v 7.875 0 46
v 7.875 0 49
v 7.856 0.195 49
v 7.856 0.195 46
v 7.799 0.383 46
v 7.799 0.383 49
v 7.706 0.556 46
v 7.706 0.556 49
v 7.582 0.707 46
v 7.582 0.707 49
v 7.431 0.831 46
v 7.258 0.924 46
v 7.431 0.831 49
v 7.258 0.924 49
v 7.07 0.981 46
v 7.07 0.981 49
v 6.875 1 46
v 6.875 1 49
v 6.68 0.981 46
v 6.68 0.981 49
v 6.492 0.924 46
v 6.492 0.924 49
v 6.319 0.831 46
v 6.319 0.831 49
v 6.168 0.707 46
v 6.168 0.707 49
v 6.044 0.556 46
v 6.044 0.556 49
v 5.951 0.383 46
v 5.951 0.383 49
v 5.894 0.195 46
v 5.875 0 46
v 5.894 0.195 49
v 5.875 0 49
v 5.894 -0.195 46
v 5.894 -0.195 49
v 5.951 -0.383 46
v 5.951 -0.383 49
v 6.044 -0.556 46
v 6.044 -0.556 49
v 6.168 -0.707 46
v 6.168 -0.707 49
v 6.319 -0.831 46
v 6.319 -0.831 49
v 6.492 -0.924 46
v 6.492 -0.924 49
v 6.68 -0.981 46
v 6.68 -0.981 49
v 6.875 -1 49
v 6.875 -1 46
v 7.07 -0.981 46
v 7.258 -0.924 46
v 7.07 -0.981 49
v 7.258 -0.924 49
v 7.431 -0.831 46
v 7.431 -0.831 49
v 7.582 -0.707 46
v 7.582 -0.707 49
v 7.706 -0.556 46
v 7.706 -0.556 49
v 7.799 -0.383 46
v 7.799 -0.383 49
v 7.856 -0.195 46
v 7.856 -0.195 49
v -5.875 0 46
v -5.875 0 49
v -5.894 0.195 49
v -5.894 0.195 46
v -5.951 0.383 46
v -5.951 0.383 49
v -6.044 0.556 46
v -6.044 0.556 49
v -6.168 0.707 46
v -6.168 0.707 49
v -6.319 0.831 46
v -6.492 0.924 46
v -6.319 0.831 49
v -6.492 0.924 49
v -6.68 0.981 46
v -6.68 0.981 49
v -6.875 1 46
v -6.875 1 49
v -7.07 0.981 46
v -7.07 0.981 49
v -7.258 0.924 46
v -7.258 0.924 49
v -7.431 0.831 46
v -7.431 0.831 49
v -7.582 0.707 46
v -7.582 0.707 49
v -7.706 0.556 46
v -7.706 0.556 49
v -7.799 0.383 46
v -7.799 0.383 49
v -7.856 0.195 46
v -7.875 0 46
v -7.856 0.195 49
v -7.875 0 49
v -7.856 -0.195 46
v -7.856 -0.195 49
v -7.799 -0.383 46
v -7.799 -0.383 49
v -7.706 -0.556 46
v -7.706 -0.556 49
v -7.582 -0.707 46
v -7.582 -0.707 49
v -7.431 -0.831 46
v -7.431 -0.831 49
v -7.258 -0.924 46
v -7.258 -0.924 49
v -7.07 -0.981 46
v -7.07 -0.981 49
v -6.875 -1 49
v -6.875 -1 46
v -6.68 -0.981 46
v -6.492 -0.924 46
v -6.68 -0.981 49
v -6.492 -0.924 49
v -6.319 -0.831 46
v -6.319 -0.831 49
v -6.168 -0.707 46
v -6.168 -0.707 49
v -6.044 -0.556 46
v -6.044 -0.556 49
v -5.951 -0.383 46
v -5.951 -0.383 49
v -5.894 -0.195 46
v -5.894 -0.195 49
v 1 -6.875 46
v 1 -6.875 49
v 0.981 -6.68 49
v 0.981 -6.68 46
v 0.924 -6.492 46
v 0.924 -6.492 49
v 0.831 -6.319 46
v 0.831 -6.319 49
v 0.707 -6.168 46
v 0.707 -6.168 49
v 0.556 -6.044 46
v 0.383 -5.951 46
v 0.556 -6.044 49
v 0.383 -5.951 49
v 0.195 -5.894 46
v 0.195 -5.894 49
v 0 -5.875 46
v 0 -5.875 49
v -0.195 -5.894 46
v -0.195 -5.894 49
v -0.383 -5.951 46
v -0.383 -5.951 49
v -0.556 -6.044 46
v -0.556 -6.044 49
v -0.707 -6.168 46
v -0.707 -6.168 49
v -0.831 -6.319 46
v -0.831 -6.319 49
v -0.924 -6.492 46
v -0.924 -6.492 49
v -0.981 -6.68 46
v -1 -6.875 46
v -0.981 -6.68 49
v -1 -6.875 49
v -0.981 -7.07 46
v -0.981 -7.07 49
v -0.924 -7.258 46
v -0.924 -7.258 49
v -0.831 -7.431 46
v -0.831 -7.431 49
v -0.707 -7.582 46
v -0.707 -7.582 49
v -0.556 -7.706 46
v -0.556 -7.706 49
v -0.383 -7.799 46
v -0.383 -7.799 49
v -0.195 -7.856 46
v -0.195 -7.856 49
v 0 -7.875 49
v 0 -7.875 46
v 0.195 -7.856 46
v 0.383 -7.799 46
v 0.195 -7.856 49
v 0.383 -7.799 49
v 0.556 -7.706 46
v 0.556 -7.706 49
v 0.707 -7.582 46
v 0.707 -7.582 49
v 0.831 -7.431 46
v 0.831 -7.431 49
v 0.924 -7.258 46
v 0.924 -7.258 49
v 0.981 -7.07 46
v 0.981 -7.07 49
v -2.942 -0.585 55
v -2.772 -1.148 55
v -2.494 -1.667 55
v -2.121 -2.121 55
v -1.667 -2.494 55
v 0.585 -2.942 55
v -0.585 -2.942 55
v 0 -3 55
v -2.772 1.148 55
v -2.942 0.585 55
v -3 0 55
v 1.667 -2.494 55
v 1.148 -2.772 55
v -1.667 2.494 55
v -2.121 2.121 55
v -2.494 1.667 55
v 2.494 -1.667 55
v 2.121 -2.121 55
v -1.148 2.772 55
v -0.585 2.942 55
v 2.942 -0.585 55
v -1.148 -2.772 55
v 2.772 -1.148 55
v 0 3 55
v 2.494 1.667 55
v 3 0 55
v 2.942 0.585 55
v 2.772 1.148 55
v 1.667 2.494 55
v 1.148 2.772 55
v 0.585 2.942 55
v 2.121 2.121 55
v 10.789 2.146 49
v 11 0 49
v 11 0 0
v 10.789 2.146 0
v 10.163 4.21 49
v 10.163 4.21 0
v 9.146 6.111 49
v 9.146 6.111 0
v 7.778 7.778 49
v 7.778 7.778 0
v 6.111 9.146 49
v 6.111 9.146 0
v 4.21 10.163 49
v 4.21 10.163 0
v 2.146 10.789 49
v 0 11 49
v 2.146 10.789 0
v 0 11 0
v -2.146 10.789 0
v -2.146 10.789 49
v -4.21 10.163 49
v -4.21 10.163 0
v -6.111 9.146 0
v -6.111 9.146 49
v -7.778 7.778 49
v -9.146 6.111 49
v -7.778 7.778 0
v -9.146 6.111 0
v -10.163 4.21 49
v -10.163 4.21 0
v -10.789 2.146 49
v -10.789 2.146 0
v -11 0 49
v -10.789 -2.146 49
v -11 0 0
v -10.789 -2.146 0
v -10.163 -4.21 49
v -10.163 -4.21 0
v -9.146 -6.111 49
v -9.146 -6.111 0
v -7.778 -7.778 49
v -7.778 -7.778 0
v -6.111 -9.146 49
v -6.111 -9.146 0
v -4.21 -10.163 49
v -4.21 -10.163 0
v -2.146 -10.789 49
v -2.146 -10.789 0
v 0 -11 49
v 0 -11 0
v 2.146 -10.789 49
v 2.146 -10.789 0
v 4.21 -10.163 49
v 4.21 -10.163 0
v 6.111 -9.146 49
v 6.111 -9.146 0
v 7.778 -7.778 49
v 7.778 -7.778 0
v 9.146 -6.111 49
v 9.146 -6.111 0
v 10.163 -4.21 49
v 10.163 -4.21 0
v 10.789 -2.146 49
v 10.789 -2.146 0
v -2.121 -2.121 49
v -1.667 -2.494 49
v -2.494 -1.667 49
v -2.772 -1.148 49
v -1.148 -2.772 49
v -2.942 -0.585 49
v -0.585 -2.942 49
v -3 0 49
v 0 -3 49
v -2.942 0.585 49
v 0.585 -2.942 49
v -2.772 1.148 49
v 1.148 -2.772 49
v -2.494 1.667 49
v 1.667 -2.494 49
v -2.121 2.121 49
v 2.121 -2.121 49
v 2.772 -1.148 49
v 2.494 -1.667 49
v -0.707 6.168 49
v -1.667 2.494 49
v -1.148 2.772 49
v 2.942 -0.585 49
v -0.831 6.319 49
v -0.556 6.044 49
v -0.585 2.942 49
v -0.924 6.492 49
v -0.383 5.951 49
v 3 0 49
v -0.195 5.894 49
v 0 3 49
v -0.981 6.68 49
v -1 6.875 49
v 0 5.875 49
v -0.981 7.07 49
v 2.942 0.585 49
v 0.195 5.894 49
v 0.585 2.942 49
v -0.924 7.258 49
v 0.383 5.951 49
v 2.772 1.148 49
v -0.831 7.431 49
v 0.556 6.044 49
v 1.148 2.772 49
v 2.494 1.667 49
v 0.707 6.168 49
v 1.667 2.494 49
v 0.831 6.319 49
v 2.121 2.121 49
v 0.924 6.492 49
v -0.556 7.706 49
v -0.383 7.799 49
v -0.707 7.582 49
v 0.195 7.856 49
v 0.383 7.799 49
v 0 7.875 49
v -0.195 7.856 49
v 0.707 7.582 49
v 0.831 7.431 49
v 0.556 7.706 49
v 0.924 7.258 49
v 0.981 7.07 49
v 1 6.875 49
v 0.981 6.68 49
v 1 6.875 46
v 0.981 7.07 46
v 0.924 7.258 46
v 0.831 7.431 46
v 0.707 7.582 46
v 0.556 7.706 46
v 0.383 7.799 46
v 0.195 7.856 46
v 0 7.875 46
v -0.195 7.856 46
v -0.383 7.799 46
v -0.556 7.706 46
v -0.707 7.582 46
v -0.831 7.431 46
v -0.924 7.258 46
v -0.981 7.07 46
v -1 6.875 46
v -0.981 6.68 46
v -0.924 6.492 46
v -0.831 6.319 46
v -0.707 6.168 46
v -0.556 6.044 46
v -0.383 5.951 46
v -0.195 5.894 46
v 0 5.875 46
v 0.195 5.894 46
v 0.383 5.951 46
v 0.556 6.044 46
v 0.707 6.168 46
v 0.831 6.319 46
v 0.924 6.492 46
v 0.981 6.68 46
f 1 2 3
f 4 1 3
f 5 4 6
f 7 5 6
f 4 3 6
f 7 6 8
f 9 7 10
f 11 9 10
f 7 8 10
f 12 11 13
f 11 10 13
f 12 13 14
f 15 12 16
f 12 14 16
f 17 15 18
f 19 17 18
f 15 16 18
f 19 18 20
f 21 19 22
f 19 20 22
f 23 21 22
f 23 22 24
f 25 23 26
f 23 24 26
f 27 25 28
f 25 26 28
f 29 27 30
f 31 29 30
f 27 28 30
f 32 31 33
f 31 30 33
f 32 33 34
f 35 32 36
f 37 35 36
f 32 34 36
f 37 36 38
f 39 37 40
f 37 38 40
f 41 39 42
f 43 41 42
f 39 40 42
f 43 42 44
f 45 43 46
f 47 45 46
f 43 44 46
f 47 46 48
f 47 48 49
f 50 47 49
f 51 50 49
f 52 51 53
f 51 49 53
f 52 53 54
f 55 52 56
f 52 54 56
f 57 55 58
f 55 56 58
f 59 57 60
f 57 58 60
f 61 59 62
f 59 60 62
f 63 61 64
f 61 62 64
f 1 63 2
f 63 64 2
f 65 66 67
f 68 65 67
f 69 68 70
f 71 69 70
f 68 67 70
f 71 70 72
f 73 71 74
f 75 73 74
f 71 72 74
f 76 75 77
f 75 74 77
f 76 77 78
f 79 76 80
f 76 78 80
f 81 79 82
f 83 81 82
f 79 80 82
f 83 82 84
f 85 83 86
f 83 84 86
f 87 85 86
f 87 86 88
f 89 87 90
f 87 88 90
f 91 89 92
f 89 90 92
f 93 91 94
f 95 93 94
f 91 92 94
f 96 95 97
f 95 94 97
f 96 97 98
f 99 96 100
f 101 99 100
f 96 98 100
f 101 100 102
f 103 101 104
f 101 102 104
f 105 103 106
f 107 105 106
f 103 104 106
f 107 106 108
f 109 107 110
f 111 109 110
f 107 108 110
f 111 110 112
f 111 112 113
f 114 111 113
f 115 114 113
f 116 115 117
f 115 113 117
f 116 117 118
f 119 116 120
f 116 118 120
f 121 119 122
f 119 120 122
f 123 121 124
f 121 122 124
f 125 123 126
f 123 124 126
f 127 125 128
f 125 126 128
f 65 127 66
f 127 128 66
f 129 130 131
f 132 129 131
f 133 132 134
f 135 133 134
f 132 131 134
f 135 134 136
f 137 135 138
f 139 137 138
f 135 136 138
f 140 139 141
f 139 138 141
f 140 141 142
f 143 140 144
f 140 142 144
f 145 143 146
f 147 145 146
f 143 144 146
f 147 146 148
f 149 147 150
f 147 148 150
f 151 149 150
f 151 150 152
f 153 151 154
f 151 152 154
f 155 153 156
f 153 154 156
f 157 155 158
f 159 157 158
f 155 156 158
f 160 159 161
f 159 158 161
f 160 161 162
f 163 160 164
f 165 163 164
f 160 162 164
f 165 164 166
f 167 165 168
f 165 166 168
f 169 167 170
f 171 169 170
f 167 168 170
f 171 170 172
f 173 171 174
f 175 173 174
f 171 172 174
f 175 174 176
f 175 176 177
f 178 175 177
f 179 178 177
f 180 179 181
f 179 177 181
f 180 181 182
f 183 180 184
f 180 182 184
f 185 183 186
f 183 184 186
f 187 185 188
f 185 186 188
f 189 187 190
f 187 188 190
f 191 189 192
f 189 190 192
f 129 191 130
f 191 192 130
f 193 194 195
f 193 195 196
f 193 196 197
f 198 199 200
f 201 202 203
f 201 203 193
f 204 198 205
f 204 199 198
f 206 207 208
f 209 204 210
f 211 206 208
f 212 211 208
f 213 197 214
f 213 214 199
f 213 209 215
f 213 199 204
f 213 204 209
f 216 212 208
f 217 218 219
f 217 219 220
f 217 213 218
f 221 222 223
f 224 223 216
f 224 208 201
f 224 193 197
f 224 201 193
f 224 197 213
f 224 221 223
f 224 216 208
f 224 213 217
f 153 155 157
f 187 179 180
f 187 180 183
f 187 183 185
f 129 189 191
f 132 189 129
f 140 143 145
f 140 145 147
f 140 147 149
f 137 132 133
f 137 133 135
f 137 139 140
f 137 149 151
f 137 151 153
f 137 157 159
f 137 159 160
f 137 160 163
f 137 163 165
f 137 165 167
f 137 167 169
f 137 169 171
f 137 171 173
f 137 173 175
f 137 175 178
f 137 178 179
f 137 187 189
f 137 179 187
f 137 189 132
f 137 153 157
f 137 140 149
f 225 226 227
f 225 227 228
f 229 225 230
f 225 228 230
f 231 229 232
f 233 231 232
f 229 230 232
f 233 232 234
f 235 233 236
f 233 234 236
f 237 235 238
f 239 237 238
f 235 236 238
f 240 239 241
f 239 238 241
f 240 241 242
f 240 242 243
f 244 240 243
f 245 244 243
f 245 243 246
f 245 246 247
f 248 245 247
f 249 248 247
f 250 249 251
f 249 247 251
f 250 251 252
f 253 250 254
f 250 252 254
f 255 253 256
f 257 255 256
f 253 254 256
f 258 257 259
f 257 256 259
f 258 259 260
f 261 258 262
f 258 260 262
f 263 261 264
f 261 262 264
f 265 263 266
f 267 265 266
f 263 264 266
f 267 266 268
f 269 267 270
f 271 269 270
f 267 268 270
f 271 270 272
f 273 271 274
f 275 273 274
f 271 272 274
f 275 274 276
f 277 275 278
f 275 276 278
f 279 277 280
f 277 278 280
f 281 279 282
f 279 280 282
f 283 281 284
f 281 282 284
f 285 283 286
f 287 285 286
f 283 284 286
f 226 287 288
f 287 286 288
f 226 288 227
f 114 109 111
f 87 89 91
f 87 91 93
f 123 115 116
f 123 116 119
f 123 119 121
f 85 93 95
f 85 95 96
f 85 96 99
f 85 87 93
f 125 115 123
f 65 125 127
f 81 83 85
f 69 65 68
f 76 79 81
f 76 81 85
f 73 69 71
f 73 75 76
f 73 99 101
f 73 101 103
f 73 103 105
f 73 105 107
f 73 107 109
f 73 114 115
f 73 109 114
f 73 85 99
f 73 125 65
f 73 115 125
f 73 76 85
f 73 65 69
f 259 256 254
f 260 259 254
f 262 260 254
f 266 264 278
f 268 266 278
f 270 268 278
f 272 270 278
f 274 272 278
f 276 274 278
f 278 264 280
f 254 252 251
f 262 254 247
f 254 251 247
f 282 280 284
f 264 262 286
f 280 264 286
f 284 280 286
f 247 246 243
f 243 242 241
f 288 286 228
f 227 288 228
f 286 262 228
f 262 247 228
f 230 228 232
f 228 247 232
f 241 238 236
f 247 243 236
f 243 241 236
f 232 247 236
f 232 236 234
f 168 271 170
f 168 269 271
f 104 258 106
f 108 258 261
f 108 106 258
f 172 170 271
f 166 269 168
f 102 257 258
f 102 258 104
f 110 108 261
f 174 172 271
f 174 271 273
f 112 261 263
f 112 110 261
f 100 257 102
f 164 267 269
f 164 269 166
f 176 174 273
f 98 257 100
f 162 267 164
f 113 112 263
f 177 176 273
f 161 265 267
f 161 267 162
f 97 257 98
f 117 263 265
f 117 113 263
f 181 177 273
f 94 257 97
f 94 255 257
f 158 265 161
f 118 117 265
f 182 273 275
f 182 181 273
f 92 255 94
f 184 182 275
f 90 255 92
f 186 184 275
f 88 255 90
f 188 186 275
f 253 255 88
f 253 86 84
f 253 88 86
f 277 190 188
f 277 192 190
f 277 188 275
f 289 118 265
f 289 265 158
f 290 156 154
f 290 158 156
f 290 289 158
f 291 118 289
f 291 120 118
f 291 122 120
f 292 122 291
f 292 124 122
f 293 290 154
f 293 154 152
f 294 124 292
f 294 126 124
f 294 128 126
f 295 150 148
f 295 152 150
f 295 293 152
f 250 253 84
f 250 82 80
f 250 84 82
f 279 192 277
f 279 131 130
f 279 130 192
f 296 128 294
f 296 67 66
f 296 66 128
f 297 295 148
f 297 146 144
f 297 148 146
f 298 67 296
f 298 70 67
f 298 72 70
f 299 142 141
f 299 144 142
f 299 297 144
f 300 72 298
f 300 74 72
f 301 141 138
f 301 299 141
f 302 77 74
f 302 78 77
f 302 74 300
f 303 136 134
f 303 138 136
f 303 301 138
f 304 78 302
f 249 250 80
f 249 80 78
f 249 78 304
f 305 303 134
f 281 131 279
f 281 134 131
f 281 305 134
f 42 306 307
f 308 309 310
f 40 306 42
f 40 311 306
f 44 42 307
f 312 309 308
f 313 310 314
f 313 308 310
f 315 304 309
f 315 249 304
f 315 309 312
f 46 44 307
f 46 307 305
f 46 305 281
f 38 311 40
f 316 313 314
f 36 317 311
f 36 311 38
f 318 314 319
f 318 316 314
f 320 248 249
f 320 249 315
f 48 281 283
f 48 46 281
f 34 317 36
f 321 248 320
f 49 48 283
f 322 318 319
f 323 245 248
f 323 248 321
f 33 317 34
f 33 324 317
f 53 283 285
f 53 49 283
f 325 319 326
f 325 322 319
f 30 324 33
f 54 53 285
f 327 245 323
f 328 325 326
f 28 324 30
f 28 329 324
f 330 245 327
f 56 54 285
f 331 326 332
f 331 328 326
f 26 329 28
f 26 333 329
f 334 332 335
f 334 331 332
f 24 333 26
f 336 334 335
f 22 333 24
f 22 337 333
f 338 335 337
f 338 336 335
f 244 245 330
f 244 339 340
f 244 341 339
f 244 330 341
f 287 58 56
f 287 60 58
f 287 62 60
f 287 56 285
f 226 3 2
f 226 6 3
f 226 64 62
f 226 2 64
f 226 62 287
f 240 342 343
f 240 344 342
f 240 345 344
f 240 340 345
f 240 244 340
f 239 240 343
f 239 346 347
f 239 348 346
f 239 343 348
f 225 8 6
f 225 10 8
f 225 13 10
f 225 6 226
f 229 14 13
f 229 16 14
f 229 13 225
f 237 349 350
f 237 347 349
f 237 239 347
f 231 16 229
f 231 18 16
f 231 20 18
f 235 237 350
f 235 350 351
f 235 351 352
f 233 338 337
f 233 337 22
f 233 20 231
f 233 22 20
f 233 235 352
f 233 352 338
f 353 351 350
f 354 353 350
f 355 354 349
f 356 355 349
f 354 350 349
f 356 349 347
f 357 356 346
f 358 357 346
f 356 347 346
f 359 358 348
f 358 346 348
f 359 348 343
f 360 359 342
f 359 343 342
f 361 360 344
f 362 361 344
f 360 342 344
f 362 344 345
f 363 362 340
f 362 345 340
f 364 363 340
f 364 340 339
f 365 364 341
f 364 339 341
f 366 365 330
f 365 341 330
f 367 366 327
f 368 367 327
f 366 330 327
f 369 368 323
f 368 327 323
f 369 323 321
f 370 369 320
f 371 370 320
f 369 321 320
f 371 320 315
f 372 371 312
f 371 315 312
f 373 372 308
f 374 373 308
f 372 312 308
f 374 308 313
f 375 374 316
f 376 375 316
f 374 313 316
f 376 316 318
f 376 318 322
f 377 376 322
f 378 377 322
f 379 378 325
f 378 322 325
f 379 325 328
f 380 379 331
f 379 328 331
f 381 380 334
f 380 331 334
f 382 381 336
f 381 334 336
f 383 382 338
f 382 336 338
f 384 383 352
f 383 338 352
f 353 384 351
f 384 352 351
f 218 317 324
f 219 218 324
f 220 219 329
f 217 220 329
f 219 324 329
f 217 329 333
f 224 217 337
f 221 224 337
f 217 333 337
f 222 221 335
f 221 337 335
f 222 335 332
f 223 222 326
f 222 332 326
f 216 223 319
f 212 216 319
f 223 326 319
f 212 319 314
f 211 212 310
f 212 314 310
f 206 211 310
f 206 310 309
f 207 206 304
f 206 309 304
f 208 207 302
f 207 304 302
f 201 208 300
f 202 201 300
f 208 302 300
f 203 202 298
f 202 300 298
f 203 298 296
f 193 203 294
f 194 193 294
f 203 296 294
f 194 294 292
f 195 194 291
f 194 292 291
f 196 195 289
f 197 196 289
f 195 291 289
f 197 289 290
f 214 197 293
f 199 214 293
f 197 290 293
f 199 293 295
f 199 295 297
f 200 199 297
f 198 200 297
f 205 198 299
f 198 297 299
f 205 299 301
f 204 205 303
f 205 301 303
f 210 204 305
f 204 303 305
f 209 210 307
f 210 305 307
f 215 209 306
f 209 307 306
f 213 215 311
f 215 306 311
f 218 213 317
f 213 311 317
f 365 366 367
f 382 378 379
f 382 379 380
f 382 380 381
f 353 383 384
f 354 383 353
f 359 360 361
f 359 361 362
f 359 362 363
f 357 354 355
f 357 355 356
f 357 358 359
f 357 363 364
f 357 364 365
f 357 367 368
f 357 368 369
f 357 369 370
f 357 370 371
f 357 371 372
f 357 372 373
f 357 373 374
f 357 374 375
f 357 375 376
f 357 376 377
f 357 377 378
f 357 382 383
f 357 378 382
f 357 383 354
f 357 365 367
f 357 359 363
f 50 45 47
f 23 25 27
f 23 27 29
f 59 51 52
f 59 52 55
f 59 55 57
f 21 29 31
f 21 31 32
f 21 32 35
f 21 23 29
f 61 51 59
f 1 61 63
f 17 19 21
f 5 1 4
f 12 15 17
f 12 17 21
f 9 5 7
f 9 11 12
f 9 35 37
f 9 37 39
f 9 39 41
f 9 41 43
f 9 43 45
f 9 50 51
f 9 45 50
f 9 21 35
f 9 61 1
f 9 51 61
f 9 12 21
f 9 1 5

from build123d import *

# Parameters (mm, degrees)
SKETCH1_R           = 11
BOSS_EXTRUDE1_DEPTH = 49
SKETCH2_R           = 1
CUT_EXTRUDE1_DEPTH  = 3
SKETCH3_R           = 3
BOSS_EXTRUDE2_DEPTH = 6


with BuildPart() as part:
    # Sketch1 → Boss-Extrude1 (new body)
    with BuildSketch(Plane.XY):
        Circle(SKETCH1_R)
    extrude(amount=BOSS_EXTRUDE1_DEPTH)

    # Sketch2 → Cut-Extrude1 (cut)
    with BuildSketch(Plane.XY.offset(49)):
        with Locations((6.875, 0)):
            Circle(SKETCH2_R)
        with Locations((0, -6.875)):
            Circle(SKETCH2_R)
        with Locations((-6.875, 0)):
            Circle(SKETCH2_R)
        with Locations((0, 6.875)):
            Circle(SKETCH2_R)
    extrude(amount=-CUT_EXTRUDE1_DEPTH, mode=Mode.SUBTRACT)

    # Sketch3 → Boss-Extrude2 (add)
    with BuildSketch(Plane.XY.offset(49)):
        Circle(SKETCH3_R)
    extrude(amount=BOSS_EXTRUDE2_DEPTH)


solid = part.part
